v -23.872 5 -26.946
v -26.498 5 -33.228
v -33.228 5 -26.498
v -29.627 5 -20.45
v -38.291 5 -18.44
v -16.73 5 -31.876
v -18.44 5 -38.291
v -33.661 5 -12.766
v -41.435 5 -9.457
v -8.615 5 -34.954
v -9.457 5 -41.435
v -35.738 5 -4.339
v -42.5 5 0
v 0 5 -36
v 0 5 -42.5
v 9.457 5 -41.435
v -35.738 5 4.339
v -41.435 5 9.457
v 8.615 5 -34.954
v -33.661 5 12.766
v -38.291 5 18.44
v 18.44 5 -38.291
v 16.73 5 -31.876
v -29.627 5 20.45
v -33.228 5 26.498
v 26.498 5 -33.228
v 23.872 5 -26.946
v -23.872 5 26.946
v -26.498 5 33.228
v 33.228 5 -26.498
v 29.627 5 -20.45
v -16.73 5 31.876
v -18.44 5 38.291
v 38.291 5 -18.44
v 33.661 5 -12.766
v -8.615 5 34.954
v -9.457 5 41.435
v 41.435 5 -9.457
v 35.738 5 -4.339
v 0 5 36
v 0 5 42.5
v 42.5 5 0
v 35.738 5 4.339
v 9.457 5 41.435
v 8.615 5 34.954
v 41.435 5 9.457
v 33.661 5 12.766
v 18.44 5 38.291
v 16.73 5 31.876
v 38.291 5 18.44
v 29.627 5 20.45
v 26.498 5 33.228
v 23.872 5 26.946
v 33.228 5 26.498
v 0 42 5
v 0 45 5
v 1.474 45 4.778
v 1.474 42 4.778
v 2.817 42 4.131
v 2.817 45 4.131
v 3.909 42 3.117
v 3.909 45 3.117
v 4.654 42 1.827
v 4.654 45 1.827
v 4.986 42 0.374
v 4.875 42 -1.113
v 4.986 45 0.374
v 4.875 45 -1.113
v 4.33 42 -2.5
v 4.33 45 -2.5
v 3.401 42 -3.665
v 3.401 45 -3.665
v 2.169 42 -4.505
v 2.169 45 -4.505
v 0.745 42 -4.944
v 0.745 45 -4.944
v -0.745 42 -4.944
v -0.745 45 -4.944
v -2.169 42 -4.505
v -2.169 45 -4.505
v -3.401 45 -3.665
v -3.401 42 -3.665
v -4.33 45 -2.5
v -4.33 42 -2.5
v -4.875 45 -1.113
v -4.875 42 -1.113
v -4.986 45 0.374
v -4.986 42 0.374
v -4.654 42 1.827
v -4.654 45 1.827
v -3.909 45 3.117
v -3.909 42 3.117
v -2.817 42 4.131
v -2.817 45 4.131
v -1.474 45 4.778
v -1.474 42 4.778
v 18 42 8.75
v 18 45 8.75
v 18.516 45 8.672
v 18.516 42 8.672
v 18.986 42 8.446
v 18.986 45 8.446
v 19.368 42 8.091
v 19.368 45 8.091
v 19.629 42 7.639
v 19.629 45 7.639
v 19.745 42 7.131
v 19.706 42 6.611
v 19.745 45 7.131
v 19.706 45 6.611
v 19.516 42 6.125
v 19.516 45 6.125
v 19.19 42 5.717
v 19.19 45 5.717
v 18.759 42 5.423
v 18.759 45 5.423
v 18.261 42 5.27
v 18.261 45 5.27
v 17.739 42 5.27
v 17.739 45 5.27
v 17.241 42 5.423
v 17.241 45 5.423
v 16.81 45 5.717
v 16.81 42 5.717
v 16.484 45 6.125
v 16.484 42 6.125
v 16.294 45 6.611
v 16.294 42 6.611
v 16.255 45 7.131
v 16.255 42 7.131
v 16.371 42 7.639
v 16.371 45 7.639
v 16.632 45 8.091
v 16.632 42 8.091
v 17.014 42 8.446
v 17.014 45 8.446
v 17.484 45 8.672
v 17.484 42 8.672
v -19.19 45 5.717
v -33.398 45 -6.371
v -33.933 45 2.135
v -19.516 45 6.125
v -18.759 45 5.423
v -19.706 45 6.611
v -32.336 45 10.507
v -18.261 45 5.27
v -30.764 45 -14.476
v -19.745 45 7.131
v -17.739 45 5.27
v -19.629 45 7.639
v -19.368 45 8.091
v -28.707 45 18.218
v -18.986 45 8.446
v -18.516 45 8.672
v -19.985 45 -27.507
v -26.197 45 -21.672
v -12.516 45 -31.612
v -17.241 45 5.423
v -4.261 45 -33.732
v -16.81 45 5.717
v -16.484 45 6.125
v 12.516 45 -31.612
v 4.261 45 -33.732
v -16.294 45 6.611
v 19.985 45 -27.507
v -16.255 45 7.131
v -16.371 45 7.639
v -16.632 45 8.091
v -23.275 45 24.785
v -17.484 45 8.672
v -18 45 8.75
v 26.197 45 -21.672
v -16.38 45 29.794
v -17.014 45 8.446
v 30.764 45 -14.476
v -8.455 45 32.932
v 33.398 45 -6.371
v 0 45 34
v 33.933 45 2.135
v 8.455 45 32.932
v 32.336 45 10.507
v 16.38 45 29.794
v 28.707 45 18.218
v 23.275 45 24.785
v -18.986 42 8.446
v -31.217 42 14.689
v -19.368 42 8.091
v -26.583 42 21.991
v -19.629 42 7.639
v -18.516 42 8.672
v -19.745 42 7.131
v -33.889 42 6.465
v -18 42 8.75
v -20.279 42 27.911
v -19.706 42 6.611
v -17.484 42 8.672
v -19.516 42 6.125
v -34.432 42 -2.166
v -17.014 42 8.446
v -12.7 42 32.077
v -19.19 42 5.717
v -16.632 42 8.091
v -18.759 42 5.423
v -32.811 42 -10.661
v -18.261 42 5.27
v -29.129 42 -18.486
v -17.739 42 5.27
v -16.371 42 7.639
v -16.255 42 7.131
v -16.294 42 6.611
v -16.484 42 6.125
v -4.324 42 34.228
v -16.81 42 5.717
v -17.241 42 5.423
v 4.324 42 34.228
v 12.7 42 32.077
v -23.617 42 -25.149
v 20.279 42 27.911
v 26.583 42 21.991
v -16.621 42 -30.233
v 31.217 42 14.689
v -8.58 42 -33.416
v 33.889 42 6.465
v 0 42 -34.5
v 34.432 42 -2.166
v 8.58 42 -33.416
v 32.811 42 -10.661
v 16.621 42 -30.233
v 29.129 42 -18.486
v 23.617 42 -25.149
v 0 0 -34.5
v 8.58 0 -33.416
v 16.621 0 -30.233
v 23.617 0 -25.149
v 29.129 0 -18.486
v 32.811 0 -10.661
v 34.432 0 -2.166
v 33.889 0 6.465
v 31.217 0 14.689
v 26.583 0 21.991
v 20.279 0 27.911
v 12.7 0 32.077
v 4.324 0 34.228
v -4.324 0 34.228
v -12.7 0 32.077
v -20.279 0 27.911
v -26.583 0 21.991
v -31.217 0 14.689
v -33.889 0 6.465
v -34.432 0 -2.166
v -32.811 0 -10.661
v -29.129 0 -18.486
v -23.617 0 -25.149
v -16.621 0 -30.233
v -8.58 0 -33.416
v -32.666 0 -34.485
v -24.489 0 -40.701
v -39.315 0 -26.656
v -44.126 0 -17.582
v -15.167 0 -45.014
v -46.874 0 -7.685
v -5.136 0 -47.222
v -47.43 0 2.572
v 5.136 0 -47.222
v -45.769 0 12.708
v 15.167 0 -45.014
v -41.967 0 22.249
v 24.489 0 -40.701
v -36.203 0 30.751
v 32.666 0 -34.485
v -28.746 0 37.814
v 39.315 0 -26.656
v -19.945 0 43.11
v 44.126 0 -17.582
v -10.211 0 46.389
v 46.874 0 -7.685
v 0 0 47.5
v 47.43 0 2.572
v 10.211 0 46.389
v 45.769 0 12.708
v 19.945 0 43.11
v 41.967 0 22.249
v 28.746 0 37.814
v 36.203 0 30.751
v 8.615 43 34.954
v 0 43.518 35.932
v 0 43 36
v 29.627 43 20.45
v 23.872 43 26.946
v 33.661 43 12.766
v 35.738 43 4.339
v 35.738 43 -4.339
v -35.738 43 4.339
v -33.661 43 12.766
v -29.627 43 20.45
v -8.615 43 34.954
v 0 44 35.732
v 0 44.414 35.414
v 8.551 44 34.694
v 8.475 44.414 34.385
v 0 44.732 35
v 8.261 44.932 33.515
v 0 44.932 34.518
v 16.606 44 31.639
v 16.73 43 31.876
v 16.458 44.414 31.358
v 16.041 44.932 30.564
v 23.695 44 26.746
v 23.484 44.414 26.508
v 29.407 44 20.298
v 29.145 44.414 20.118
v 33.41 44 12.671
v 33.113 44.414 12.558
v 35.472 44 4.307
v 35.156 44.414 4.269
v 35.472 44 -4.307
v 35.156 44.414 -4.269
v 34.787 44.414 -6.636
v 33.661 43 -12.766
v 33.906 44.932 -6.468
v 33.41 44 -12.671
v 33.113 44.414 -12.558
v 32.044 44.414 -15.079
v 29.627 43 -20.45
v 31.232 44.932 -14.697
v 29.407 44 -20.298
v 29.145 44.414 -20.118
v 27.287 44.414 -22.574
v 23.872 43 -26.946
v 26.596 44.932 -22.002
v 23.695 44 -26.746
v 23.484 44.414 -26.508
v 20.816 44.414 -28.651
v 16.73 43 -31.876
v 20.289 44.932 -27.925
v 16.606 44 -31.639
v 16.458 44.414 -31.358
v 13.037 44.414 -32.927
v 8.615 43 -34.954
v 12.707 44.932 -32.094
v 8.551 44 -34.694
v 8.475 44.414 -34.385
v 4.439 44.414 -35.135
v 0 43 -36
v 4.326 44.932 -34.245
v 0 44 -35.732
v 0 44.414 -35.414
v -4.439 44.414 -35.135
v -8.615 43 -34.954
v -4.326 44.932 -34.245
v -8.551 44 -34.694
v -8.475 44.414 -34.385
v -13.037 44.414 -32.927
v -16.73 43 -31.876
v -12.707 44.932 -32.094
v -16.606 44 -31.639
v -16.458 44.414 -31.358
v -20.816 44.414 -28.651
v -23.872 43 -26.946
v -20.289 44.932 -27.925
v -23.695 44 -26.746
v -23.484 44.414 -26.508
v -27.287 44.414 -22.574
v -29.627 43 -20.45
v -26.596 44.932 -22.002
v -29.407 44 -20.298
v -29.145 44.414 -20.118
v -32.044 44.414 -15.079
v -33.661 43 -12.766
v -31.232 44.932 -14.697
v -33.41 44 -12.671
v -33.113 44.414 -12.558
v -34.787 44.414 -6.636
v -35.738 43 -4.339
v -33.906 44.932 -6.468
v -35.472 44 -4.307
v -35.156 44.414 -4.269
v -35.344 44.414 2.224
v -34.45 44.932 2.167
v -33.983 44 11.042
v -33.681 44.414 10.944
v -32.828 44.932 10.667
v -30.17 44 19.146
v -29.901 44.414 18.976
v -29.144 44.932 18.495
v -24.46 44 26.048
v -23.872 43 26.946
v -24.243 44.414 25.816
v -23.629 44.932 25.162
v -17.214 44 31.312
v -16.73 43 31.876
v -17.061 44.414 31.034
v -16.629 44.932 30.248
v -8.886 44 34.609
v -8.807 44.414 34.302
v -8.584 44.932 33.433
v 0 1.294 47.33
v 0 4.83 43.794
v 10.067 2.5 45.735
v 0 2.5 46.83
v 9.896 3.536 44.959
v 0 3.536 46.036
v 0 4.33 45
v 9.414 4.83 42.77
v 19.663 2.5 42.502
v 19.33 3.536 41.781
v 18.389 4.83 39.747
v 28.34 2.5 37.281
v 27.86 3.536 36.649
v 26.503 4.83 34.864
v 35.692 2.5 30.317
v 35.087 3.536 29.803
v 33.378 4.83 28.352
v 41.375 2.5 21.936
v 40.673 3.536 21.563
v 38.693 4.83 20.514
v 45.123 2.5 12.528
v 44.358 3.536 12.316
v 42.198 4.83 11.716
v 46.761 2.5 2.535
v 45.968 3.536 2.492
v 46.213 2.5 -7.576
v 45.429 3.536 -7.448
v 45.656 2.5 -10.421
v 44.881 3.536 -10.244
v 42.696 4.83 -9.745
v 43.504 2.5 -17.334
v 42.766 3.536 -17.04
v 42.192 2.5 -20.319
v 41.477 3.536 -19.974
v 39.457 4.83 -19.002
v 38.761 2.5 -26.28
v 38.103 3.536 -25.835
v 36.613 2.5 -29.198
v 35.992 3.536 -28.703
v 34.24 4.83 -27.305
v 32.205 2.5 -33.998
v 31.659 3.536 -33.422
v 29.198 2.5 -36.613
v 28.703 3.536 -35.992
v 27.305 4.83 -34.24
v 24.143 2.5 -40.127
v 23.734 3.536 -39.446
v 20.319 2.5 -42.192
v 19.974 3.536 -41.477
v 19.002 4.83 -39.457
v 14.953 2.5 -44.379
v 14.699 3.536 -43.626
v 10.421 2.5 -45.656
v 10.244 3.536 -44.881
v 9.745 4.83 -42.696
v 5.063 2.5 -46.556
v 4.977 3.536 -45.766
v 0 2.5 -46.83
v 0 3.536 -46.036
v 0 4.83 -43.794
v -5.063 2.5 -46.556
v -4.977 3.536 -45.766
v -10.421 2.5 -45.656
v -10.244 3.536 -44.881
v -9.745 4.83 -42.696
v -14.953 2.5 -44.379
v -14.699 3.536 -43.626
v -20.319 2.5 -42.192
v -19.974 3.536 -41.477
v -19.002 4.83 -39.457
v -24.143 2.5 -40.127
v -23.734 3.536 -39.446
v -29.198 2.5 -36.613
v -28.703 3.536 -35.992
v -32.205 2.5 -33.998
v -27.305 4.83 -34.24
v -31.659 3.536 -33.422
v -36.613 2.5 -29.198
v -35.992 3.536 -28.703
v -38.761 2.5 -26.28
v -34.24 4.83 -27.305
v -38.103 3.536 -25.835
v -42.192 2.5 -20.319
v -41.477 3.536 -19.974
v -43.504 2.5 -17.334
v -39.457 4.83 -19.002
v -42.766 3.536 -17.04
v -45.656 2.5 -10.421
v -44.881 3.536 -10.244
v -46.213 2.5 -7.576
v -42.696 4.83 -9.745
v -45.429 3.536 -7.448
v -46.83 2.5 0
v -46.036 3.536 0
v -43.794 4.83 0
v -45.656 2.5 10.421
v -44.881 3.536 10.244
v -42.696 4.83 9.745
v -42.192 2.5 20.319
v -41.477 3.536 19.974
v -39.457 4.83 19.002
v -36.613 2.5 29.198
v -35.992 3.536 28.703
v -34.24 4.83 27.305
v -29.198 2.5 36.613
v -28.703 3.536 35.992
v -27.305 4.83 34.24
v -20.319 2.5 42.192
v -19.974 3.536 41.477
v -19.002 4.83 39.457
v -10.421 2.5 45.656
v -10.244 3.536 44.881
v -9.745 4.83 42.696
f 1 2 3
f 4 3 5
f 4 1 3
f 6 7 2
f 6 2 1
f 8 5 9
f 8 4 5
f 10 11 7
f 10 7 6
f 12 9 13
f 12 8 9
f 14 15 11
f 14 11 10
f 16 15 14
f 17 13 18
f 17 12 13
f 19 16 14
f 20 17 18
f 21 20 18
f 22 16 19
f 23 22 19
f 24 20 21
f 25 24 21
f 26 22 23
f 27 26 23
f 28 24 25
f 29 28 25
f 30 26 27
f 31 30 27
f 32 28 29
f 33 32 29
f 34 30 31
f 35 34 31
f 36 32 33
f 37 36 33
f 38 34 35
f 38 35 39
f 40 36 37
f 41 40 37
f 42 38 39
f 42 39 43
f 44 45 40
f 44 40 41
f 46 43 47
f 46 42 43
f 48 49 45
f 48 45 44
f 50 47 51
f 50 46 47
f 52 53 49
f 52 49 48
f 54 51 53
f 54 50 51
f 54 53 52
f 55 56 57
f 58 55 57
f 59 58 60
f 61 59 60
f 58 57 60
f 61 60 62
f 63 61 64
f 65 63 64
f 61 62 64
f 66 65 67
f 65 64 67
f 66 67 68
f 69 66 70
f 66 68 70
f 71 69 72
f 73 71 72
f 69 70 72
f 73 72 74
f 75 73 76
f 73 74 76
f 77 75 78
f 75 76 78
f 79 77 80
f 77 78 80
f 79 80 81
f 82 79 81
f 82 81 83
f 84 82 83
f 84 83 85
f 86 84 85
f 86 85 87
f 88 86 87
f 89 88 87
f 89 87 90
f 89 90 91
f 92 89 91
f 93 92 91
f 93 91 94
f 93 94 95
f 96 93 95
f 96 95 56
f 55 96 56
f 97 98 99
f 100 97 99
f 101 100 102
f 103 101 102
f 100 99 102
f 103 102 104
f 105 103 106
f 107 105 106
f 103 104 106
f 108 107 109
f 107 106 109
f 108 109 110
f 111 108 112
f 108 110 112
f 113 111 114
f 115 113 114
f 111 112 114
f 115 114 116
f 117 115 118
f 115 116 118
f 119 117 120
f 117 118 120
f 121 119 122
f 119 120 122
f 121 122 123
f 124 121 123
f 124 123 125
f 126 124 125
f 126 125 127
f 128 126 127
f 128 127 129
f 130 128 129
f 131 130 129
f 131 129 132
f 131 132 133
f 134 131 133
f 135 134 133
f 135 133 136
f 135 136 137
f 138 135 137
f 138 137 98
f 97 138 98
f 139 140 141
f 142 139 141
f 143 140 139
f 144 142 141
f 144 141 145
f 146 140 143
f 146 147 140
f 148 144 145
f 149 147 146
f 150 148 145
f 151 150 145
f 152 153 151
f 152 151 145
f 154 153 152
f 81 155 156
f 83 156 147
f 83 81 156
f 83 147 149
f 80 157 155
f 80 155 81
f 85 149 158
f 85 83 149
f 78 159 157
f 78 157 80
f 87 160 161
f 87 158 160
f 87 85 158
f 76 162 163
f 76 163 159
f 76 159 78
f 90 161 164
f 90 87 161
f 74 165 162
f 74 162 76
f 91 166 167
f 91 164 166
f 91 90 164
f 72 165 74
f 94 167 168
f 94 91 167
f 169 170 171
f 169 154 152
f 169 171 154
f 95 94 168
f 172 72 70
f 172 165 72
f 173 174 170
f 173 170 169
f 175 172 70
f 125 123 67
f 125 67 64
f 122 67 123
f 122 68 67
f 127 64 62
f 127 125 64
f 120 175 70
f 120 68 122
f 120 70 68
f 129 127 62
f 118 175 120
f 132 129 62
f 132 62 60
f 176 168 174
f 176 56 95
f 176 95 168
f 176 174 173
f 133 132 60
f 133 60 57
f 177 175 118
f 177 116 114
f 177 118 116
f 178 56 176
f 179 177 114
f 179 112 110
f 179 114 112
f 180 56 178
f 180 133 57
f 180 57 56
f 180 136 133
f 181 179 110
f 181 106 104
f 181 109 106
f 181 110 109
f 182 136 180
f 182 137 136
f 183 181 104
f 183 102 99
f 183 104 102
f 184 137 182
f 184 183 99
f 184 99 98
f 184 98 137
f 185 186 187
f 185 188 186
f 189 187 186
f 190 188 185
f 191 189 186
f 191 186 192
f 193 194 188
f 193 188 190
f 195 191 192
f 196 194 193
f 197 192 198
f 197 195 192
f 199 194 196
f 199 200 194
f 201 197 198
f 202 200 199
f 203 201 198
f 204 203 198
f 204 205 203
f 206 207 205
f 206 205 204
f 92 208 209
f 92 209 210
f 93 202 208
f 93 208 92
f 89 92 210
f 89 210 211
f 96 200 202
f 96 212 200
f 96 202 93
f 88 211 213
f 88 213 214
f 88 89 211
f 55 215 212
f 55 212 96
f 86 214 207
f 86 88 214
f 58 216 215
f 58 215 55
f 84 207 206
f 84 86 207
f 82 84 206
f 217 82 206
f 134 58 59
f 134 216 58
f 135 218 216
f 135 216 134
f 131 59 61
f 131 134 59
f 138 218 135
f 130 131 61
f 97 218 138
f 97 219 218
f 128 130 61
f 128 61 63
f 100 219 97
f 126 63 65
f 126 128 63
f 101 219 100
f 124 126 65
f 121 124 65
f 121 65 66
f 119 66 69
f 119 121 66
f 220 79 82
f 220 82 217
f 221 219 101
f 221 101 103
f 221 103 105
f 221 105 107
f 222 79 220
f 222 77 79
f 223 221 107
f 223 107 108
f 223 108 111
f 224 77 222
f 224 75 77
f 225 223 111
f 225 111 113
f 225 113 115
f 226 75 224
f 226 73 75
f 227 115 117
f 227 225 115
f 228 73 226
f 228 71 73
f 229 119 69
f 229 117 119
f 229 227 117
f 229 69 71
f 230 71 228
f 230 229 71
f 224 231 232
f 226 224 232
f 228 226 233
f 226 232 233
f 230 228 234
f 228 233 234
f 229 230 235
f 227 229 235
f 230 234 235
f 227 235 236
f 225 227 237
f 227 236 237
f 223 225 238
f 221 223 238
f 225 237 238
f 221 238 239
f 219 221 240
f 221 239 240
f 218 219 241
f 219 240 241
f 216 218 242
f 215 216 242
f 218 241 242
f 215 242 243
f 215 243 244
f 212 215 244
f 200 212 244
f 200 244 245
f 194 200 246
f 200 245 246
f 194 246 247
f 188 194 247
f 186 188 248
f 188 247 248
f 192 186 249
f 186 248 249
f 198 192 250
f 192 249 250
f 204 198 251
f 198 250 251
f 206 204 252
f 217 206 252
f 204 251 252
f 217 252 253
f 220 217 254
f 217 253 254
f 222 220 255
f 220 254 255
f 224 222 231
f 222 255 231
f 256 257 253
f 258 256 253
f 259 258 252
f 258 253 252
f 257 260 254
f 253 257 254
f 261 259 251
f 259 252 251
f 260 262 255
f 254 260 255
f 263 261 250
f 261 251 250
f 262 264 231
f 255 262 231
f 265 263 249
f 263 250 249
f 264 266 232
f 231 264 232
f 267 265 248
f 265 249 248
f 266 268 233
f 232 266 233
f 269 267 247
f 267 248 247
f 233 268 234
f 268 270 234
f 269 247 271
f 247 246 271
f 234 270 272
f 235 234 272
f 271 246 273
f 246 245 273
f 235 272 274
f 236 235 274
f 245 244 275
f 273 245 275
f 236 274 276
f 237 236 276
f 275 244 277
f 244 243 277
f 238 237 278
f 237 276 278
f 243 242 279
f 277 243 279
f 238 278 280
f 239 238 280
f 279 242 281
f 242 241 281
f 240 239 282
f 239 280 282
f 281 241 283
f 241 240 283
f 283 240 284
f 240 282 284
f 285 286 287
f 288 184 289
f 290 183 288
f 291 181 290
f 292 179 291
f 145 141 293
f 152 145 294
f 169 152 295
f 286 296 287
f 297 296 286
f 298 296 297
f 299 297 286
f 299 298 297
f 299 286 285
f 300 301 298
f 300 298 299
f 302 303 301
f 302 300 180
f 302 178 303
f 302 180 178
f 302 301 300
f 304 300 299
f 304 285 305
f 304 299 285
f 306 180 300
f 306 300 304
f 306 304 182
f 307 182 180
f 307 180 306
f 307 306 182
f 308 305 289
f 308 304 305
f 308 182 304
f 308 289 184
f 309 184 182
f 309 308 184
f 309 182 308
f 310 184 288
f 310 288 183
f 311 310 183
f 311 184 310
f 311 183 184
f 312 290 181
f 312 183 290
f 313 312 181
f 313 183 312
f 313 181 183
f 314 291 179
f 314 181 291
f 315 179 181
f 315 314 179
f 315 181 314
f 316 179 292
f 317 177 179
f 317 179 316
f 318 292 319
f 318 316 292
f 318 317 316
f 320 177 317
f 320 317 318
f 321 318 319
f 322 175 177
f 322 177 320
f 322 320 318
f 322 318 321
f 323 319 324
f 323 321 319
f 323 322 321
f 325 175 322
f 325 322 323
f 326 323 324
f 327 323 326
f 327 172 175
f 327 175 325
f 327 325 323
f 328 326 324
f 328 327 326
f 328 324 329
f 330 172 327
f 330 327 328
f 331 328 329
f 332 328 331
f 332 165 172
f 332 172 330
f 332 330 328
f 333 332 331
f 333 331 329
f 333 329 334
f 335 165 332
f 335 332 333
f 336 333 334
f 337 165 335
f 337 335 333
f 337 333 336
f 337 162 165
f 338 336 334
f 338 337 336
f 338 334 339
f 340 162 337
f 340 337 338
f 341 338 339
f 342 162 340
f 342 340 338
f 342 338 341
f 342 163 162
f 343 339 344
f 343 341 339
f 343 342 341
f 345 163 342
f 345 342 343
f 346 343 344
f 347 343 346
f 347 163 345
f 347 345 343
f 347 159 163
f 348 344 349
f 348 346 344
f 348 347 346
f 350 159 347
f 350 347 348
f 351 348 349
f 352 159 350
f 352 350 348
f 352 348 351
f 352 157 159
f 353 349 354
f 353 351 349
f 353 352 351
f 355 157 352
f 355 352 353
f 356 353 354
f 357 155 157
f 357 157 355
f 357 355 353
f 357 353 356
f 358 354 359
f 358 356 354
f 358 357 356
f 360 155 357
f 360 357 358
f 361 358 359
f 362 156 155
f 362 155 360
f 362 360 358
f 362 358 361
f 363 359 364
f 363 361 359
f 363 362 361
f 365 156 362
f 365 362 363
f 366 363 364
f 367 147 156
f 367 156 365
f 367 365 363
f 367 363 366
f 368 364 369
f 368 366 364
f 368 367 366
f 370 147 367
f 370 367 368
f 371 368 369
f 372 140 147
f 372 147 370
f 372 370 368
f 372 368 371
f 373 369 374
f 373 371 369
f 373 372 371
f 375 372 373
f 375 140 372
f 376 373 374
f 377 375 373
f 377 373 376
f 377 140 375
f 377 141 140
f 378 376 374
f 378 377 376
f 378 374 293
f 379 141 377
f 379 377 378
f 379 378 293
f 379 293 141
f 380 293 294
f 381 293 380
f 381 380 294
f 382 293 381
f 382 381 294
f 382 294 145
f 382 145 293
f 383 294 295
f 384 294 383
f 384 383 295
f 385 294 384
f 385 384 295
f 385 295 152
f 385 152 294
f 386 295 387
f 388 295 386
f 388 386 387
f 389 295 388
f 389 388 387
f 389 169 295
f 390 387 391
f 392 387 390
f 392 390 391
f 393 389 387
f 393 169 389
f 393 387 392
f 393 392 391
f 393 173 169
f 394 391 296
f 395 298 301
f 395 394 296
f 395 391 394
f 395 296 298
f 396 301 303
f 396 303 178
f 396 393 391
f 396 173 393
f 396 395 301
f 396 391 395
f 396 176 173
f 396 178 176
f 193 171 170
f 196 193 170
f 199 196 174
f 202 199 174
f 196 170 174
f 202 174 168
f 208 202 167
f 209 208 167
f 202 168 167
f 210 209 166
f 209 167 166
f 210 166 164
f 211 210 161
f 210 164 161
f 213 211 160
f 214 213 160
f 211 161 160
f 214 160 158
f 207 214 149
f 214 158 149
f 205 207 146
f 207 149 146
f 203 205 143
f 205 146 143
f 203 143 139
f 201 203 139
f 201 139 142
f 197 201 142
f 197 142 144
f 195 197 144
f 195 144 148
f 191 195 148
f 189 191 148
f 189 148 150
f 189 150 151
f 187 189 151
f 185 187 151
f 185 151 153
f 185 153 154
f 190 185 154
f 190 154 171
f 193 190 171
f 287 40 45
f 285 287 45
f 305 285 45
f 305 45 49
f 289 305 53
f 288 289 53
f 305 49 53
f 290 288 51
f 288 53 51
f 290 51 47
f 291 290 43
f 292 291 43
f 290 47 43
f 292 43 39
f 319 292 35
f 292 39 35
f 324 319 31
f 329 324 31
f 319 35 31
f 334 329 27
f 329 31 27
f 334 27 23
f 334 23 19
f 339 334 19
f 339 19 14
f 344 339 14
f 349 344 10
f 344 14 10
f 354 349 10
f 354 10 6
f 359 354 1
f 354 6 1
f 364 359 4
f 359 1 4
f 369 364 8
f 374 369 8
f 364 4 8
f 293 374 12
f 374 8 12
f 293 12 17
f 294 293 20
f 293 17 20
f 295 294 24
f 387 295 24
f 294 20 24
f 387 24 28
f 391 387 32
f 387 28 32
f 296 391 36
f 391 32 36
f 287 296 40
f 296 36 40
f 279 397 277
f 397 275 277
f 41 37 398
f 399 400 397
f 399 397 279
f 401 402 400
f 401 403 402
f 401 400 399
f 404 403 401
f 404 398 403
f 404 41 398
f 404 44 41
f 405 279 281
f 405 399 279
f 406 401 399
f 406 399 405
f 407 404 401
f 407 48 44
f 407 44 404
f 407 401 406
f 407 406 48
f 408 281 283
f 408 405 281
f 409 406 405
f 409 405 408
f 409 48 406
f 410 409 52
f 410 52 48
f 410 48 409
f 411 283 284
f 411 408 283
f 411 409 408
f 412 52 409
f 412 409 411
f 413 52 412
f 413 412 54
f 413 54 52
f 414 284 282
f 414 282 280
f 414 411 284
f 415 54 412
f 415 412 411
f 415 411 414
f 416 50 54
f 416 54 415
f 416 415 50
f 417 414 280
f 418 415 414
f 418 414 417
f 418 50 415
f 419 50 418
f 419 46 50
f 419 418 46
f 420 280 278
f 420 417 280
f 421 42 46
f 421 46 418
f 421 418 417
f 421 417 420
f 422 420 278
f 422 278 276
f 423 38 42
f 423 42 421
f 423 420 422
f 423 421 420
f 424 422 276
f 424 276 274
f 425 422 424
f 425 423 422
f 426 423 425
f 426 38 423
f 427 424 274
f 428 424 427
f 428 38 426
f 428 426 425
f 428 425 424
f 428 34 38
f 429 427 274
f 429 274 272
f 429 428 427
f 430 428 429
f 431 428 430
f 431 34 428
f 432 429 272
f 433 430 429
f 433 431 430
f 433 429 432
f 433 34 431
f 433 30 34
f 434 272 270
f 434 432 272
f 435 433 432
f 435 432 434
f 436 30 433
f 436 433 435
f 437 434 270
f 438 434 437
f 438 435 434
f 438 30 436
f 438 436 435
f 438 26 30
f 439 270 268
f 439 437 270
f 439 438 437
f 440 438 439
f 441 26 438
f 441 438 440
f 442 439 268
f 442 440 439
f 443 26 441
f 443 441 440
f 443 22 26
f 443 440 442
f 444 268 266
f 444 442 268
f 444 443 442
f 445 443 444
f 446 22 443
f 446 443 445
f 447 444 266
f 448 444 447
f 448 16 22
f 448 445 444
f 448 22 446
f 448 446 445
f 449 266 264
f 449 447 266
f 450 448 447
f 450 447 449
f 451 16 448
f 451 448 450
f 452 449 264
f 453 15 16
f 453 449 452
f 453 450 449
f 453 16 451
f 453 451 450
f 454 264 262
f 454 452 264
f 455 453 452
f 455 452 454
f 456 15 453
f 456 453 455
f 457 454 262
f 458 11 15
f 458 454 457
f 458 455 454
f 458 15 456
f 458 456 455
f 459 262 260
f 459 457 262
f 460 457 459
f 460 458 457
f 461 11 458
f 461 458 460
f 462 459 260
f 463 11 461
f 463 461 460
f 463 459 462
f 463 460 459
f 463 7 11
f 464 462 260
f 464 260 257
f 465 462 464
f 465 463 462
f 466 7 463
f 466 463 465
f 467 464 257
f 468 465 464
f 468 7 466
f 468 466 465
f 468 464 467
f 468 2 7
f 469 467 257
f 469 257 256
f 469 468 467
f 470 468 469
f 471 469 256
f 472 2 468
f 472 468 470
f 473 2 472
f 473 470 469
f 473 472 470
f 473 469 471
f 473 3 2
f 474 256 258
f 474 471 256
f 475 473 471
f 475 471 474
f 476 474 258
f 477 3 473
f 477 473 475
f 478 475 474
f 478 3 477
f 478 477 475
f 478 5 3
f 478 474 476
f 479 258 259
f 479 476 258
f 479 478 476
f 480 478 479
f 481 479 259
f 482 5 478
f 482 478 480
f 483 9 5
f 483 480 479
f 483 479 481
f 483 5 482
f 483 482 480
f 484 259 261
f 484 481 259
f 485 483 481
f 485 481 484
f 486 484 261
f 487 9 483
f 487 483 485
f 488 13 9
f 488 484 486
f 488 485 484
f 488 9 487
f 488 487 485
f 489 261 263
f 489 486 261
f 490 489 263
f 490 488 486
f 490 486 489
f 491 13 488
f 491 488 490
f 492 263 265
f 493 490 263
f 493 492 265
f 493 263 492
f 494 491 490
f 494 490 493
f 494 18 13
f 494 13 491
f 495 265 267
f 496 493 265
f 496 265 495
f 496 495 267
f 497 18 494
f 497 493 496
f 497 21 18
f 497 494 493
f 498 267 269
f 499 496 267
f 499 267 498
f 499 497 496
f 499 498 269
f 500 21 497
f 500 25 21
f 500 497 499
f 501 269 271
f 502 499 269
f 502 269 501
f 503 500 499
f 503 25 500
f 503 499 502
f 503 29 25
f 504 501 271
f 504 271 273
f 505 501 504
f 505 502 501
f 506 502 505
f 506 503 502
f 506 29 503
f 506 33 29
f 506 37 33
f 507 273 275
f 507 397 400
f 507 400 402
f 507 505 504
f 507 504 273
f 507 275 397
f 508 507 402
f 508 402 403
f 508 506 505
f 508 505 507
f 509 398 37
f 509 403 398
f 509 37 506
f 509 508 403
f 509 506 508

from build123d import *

# Parameters (mm, degrees)
SKETCH1_R           = 47.5
BOSS_EXTRUDE1_DEPTH = 5
SKETCH2_R           = 36
BOSS_EXTRUDE2_DEPTH = 40
SKETCH3_R           = 34.5
CUT_EXTRUDE1_DEPTH  = 42
SKETCH4_R           = 5
CUT_EXTRUDE2_DEPTH  = 5
FILLET1_R           = 5
SKETCH5_R           = 1.75
CUT_EXTRUDE3_DEPTH  = 5
FILLET2_R           = 2


with BuildPart() as part:
    # Sketch1 → Boss-Extrude1 (new body)
    with BuildSketch(Plane(origin=(0, 0, 0), x_dir=(1, 0, 0), z_dir=(0, 1, 0))):
        with Locations(Location((0, 0, 0), (0, 0, 270))):
            Circle(SKETCH1_R)
    extrude(amount=BOSS_EXTRUDE1_DEPTH)

    # Sketch2 → Boss-Extrude2 (add)
    with BuildSketch(Plane(origin=(0, 5, 0), x_dir=(1, 0, 0), z_dir=(0, 1, 0))):
        with Locations(Location((0, 0, 0), (0, 0, 270))):
            Circle(SKETCH2_R)
    extrude(amount=BOSS_EXTRUDE2_DEPTH)

    # Sketch3 → Cut-Extrude1 (cut)
    with BuildSketch(Plane.XZ):
        with Locations(Location((0, 0, 0), (0, 0, 270))):
            Circle(SKETCH3_R)
    extrude(amount=-CUT_EXTRUDE1_DEPTH, mode=Mode.SUBTRACT)

    # Sketch4 → Cut-Extrude2 (cut)
    with BuildSketch(Plane(origin=(0, 45, 0), x_dir=(1, 0, 0), z_dir=(0, 1, 0))):
        with Locations(Location((0, 0, 0), (0, 0, 270))):
            Circle(SKETCH4_R)
    extrude(amount=-CUT_EXTRUDE2_DEPTH, mode=Mode.SUBTRACT)

    # Fillet1
    fillet1_edges = [part.edges().sort_by_distance(p)[0] for p in [
        (0, 5, -47.5),
    ]]
    fillet(fillet1_edges, radius=FILLET1_R - 0.0001)  # a hair under: the kernel refuses the full size

    # Sketch5 → Cut-Extrude3 (cut)
    with BuildSketch(Plane(origin=(0, 45, 0), x_dir=(1, 0, 0), z_dir=(0, 1, 0))):
        with Locations(Location((18, -7, 0), (0, 0, 270))):
            Circle(SKETCH5_R)
        with Locations(Location((-18, -7, 0), (0, 0, 270))):
            Circle(SKETCH5_R)
    extrude(amount=-CUT_EXTRUDE3_DEPTH, mode=Mode.SUBTRACT)

    # Fillet2
    fillet2_edges = [part.edges().sort_by_distance(p)[0] for p in [
        (0, 45, -36),
    ]]
    fillet(fillet2_edges, radius=FILLET2_R)


solid = part.part
